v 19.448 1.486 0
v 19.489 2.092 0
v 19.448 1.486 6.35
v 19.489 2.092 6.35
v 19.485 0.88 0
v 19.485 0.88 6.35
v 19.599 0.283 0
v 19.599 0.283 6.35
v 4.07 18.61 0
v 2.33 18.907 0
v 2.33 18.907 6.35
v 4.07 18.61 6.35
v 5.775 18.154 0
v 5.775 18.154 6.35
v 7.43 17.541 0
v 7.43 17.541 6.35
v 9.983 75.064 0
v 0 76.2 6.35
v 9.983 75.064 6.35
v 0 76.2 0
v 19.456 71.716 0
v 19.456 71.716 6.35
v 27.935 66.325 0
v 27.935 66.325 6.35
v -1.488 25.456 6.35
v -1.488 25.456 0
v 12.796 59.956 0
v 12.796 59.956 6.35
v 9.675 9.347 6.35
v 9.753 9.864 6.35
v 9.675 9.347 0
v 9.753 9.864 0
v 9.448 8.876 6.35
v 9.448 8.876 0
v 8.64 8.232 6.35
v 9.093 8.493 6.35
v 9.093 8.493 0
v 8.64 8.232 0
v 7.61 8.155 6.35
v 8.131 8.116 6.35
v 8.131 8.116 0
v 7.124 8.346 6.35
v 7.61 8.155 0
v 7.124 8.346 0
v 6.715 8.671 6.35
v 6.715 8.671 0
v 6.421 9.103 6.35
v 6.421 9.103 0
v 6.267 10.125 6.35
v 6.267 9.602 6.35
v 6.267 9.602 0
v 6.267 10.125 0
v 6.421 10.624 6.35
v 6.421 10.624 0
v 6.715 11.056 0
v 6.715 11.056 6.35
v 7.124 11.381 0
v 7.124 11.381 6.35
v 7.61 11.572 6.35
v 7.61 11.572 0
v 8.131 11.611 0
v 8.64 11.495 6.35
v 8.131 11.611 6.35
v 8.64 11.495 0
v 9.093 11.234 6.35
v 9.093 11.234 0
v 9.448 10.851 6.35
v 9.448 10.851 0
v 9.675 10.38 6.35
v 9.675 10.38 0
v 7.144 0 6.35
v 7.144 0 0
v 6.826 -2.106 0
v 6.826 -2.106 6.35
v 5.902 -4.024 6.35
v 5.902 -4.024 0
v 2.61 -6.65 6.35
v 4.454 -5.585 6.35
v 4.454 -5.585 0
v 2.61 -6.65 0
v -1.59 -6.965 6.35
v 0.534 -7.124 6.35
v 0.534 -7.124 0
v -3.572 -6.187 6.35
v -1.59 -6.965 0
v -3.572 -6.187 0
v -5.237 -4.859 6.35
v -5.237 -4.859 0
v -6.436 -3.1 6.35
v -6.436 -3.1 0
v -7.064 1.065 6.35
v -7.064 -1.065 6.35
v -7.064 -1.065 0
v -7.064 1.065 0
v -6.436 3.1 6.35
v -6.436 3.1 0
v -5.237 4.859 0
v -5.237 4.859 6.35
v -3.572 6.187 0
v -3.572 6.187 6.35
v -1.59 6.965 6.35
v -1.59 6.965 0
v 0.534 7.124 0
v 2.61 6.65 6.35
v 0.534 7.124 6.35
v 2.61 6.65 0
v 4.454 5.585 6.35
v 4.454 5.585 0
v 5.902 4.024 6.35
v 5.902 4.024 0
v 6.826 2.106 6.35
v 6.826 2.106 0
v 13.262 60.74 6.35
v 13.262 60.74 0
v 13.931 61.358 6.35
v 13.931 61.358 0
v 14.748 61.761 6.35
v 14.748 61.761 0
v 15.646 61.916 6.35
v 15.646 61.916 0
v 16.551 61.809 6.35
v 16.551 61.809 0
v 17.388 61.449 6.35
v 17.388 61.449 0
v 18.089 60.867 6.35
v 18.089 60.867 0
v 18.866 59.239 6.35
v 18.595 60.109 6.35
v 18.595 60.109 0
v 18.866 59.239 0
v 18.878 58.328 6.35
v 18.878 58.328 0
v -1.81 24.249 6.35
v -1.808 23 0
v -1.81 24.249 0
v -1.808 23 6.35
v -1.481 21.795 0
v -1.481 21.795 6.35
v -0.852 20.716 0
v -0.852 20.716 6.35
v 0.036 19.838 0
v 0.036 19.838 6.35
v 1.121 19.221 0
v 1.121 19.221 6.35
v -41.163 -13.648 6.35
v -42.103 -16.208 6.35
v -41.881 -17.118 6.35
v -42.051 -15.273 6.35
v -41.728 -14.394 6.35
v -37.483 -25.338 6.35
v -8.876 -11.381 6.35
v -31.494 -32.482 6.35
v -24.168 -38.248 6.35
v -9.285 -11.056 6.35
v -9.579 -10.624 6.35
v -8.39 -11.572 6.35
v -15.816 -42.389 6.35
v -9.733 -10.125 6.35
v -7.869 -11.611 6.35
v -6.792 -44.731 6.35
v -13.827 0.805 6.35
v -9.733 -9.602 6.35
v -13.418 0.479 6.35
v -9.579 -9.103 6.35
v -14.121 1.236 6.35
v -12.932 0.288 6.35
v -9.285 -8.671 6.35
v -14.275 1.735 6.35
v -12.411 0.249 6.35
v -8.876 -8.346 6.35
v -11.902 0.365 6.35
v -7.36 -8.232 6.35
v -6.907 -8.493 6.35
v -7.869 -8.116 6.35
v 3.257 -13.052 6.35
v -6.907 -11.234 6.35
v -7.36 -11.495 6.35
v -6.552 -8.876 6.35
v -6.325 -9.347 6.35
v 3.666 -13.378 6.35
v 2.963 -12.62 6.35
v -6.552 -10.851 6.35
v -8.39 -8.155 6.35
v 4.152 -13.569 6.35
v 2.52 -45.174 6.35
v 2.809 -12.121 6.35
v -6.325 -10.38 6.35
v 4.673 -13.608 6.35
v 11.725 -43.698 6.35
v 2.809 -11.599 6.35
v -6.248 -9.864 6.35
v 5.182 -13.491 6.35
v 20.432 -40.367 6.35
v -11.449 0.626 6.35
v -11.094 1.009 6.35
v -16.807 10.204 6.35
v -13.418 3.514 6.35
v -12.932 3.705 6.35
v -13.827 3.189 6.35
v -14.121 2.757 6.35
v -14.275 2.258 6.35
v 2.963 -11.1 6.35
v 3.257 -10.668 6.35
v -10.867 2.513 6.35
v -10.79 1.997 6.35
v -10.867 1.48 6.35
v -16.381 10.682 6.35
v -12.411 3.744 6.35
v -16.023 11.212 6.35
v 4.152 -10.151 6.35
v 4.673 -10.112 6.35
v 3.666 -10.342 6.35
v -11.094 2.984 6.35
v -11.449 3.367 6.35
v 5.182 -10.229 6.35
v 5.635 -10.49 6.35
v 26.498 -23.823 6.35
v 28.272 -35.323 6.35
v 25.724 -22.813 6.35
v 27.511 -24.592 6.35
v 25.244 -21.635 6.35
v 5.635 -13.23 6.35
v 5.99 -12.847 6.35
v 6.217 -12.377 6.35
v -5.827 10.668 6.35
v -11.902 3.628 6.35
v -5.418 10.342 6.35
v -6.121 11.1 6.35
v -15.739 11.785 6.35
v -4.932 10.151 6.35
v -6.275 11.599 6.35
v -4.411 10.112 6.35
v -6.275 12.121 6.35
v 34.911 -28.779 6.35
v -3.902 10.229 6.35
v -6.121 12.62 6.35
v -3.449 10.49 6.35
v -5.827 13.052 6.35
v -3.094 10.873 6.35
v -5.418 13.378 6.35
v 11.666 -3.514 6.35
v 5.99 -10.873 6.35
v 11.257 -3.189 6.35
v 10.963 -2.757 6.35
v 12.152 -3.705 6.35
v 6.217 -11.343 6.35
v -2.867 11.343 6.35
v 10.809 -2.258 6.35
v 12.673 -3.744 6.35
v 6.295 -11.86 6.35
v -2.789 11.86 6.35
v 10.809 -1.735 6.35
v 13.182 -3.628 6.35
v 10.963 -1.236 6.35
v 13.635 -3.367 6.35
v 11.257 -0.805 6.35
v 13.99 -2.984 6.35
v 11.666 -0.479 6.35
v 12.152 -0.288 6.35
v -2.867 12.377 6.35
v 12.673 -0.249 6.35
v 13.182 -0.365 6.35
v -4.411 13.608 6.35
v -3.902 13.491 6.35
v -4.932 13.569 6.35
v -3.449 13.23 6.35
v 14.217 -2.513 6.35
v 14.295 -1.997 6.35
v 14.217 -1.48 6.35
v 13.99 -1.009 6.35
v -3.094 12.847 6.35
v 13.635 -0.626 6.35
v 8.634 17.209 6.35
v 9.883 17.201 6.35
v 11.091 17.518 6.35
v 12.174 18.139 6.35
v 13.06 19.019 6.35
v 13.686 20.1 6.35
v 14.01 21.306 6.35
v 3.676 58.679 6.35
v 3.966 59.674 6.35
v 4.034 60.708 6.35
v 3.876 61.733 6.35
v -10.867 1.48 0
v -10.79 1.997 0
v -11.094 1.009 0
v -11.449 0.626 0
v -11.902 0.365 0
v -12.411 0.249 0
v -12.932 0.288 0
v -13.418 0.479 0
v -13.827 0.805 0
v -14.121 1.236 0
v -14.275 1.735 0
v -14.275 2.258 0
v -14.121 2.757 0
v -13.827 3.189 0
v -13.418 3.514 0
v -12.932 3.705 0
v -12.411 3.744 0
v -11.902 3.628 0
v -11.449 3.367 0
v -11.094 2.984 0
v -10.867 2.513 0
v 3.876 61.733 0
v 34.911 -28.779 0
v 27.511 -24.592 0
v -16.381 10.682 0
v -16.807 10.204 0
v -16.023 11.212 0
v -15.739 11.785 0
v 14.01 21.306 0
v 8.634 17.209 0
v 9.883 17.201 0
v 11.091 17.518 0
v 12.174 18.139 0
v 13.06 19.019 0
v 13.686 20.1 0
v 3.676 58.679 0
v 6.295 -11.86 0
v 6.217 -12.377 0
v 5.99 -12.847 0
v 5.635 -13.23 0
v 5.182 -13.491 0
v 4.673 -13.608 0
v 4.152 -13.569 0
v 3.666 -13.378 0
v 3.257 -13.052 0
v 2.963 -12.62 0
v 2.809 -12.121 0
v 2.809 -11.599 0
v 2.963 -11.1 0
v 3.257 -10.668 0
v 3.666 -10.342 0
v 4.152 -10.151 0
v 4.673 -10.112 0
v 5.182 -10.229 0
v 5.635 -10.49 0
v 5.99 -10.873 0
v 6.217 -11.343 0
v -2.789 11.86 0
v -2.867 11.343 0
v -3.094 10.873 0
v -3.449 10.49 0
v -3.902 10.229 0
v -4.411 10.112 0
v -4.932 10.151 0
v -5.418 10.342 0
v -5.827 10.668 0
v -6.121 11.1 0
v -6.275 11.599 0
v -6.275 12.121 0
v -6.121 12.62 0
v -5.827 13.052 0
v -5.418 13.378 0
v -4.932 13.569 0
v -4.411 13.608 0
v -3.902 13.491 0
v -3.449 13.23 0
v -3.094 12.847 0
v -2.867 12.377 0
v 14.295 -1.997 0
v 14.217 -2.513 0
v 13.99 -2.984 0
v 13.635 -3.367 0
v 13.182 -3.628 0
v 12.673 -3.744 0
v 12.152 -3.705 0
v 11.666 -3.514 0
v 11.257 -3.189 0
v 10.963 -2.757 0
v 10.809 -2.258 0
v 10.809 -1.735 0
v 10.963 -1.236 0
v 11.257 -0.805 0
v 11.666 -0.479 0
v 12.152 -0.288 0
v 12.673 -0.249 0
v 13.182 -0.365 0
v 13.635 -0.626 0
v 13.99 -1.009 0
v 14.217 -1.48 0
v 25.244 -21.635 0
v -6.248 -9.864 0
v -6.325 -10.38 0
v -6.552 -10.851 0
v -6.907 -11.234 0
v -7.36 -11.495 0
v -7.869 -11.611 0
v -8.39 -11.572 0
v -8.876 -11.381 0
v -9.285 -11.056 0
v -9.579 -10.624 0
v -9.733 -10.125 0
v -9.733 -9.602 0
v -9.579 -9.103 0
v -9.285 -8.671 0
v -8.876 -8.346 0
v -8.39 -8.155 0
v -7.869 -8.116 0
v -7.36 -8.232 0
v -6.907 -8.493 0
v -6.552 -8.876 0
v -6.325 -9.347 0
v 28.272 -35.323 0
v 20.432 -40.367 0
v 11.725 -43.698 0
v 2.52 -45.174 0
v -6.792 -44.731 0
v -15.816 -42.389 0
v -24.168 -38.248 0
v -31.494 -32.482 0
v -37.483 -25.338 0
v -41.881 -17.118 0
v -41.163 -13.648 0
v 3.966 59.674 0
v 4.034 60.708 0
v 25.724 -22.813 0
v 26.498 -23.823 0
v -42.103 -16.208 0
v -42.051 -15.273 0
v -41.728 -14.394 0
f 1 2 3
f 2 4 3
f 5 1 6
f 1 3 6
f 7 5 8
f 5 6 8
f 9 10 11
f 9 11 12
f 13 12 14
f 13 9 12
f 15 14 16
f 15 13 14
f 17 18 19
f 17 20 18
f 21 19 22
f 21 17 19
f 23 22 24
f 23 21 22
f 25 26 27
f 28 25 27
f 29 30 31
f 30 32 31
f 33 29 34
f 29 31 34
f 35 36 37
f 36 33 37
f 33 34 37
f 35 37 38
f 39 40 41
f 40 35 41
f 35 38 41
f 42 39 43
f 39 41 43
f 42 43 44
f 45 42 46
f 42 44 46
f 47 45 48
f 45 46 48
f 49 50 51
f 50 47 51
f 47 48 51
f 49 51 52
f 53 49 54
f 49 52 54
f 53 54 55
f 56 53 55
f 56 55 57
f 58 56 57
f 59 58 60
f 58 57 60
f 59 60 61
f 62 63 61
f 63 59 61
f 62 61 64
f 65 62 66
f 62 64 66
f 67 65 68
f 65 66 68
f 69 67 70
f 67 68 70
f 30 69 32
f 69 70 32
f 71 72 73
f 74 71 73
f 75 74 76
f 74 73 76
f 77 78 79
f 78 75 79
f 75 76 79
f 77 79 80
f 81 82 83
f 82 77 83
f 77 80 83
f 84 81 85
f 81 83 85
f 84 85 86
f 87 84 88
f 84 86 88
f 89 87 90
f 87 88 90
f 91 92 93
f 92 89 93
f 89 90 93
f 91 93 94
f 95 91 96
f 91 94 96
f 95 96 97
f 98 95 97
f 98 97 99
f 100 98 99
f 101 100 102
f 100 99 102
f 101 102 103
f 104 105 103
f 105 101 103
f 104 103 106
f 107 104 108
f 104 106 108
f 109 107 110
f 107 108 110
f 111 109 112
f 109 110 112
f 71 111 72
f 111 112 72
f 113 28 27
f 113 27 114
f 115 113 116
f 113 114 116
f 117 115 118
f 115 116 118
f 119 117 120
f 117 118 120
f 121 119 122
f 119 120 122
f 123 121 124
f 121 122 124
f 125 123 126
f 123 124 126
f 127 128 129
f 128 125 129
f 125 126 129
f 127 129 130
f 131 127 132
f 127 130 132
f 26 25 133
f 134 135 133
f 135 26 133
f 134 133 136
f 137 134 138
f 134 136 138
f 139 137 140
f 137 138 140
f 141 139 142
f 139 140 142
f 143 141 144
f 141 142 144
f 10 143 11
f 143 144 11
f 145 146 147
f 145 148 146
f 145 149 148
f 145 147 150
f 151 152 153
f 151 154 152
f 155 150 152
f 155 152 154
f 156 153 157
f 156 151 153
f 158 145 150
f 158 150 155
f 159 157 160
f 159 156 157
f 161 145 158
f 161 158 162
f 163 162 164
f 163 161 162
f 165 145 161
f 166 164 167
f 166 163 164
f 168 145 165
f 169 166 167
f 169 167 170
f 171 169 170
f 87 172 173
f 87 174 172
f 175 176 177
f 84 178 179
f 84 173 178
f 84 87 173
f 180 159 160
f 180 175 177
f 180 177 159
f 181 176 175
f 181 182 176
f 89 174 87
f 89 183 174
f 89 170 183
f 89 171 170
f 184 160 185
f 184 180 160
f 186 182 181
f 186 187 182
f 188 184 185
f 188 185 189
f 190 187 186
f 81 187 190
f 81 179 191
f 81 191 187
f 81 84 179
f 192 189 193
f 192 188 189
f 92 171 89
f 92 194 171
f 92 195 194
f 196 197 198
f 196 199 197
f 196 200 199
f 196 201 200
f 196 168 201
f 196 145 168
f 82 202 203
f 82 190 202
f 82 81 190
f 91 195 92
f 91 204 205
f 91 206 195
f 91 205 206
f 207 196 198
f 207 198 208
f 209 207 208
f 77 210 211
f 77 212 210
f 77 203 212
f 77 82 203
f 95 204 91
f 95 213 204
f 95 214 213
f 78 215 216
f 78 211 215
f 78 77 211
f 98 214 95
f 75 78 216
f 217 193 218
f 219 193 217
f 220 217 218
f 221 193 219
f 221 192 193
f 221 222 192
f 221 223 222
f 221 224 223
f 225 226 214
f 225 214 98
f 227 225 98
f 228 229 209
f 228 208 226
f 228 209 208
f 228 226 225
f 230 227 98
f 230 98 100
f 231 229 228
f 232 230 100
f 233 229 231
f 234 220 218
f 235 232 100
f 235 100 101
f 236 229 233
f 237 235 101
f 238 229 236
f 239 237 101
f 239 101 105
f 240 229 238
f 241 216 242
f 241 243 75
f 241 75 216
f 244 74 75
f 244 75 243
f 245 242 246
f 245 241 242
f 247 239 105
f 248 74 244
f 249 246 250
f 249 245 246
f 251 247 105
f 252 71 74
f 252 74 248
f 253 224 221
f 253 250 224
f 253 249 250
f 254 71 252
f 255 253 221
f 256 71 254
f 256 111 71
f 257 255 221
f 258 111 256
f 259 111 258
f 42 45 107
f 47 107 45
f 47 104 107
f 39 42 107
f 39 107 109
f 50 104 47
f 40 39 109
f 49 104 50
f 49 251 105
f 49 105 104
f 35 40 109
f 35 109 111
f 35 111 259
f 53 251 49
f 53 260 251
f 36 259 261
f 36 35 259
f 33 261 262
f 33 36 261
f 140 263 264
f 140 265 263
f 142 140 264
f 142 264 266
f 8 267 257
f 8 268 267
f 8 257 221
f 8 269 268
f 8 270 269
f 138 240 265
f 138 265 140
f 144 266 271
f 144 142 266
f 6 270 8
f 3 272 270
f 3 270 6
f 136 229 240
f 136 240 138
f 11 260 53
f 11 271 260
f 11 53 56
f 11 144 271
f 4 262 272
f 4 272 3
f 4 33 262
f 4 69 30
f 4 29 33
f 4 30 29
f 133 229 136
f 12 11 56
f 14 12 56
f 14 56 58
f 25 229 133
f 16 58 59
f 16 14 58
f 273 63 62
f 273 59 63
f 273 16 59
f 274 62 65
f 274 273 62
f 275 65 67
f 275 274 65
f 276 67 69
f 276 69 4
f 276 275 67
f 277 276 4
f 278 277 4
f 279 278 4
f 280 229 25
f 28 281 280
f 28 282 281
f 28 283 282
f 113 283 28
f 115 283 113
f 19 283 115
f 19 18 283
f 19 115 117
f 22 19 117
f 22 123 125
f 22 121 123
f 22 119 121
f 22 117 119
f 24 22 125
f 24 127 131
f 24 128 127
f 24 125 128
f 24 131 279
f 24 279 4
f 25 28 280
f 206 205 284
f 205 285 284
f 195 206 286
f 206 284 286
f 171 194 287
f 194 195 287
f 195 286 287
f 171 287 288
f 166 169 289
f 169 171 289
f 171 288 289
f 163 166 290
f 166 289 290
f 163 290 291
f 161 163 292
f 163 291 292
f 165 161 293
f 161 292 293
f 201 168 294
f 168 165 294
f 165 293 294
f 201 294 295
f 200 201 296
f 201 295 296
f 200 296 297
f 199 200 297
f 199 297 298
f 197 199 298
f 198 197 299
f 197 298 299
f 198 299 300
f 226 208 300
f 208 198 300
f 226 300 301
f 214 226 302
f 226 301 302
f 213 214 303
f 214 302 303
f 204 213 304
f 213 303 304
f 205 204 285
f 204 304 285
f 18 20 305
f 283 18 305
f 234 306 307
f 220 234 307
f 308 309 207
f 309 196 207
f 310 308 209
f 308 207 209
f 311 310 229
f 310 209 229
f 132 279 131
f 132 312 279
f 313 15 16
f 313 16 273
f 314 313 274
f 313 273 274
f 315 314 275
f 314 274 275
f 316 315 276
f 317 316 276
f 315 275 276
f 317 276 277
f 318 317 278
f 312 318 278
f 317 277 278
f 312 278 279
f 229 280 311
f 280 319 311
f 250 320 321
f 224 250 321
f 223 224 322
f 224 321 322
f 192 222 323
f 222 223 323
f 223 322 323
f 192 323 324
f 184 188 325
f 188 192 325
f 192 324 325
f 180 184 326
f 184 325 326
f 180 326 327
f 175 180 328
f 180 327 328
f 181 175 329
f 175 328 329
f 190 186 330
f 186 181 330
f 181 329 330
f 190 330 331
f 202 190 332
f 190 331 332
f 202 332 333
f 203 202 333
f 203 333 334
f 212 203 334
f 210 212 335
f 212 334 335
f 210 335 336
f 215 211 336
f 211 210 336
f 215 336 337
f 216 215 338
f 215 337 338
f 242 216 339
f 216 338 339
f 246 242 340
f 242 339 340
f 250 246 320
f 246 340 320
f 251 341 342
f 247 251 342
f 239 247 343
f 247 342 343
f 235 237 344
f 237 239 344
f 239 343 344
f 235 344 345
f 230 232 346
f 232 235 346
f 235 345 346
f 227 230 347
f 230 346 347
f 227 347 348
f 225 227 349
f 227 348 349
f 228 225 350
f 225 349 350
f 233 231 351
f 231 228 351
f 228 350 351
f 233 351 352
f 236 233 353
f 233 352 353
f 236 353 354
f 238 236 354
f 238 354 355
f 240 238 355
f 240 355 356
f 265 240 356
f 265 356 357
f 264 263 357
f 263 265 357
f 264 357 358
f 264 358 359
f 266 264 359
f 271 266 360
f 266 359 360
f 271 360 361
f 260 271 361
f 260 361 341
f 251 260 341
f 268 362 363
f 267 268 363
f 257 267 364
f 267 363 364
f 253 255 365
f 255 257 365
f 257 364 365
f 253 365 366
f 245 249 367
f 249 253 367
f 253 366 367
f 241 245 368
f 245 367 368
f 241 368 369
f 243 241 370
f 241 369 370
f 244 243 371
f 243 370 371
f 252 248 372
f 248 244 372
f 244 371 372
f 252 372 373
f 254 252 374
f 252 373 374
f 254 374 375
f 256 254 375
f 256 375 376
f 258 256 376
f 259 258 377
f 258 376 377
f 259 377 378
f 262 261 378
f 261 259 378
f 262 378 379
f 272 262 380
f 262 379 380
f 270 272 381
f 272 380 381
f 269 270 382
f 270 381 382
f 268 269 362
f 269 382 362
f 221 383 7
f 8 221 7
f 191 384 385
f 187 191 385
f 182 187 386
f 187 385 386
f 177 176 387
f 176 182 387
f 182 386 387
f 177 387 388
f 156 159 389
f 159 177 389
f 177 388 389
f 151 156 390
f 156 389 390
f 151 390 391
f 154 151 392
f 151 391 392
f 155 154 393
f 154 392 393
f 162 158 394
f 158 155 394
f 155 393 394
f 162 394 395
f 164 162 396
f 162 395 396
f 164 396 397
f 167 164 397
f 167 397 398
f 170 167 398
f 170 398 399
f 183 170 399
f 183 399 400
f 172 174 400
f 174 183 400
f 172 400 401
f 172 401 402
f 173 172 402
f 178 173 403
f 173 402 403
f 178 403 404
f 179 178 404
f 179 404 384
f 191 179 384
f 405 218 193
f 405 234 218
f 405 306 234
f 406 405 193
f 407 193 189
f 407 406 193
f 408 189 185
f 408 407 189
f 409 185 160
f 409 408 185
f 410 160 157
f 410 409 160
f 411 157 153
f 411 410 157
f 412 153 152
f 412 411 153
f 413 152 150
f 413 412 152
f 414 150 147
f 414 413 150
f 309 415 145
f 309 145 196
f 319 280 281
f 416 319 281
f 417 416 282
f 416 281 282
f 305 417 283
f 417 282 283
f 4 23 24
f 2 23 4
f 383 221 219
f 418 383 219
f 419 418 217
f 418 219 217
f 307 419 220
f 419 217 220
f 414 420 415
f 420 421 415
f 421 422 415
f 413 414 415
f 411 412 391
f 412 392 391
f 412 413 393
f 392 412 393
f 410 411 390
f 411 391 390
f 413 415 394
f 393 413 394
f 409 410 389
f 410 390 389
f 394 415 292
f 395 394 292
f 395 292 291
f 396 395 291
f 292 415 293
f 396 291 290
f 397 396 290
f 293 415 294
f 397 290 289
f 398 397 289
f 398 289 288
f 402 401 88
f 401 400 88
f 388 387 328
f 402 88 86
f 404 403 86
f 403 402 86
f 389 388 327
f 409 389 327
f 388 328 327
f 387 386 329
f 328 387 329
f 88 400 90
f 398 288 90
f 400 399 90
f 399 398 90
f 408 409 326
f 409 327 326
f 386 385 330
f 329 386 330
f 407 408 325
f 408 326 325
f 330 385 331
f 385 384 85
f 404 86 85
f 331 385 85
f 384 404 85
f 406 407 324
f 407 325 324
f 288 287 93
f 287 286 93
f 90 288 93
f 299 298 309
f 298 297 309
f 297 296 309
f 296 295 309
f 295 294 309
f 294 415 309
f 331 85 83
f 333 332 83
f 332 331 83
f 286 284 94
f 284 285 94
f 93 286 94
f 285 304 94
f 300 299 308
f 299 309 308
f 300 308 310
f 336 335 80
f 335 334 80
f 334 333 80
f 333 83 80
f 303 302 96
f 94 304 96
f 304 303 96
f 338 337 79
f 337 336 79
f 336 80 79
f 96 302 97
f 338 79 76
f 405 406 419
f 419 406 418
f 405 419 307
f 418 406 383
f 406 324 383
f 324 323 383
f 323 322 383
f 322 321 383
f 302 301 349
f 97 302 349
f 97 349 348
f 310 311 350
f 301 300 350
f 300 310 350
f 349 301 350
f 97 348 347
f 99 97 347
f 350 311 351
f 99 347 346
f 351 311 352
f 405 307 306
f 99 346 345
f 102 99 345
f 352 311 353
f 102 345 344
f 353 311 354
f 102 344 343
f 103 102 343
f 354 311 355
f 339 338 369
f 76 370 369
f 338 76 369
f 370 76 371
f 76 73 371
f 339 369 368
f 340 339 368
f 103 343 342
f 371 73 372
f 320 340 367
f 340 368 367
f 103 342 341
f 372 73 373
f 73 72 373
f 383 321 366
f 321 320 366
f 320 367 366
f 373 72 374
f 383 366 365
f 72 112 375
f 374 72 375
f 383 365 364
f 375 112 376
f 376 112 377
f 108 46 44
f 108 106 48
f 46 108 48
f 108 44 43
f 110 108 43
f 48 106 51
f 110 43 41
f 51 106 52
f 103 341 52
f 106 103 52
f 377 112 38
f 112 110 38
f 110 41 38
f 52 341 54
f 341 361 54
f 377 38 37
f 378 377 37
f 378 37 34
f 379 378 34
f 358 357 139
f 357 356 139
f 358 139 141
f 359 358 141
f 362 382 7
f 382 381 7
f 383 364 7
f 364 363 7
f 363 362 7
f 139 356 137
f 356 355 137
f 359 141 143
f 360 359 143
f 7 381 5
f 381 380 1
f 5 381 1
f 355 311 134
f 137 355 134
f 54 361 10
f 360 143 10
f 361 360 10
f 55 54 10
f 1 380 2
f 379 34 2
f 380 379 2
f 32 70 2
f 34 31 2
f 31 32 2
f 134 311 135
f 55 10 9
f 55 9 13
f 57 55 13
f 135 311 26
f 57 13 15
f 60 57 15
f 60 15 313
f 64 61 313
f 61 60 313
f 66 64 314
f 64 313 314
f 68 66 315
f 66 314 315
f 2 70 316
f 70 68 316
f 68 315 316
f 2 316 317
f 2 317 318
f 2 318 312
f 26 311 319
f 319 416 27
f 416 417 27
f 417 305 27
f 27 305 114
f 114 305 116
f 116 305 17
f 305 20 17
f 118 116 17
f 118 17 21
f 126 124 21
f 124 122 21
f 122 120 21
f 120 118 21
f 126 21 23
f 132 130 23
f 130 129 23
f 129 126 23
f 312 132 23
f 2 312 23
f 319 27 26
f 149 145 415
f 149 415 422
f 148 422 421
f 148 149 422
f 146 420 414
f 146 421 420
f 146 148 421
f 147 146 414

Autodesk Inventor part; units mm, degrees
ref_plane "YZ Plane" through (0, 0, 0) normal (1, 0, 0) x (0, 1, 0)
ref_plane "XZ Plane" through (0, 0, 0) normal (0, 1, 0) x (-1, 0, 0)
ref_plane "XY Plane" through (0, 0, 0) normal (0, 0, 1) x (1, 0, 0)
sketch "Sketch1" plane through (0, 0, 0) normal (0, 0, 1) x (1, 0, 0)
  circle A0 centre (0, 0) radius 76.2 construction
  circle A1 centre (0, 0) radius 7.1437
  circle A2 centre (0, 0) radius 12.7 construction
  circle A3 centre (0, 0) radius 19.05
  line L0 (0, 76.2) -> (0, 0) construction
  line L1 (0, 76.2) -> (4.2947, 60.1719)
  line L2 (4.2947, 60.1719) -> (-17.6011, 7.2873)
  circle A4 centre (0, 0) radius 60.325 construction
  arc A5 (27.9352, 66.3249) -> (0, 76.2) centre (0, 31.75) ccw
  line L3 (27.9352, 66.3249) -> (18.8874, -2.4836)
  circle A6 centre (0, 0) radius 45.2437 construction
  line L4 (34.9112, -28.7786) -> (0, 0) construction
  line L5 (34.9112, -28.7786) -> (25.7494, -23.595)
  line L6 (25.7494, -23.595) -> (18.4479, 4.7518)
  circle A7 centre (0, 0) radius 34.925 construction
  arc A8 (-42.6486, -15.1027) -> (34.9112, -28.7786) centre (0, 0) ccw
  line L7 (-42.6486, -15.1027) -> (-13.3288, 13.6105)
  line L8 (-42.6486, -15.1027) -> (0, 0) construction
  line L9 (-4.3483, 18.5471) -> (12.7964, 59.9565)
  line L10 (13.0349, 13.8922) -> (18.8778, 58.328)
  arc A9 (18.8778, 58.328) -> (12.7964, 59.9565) centre (15.7299, 58.7419) ccw
  line L11 (-10.5232, 7.11) -> (0, 0) construction
  line L12 (0, 0) -> (-4.542, 11.86) construction
  circle A10 centre (-4.542, 11.86) radius 1.7526
  circle A11 centre (-12.5421, 1.9966) radius 1.7526
  circle A12 centre (-8.0001, -9.8635) radius 1.7526
  circle A13 centre (4.542, -11.86) radius 1.7526
  circle A14 centre (12.5421, -1.9966) radius 1.7526
  circle A15 centre (8.0001, 9.8635) radius 1.7526
  point P0 (19.3687, 1.1767)
  point P1 (-15.8759, 11.4541)
  point P2 (-16.1113, 10.8856)
  dimension "d0" = 152.4
  dimension "d14" = 15.875
  dimension "d17" = 69.85
  dimension "d1" = 14.2875
  dimension "d2" = 25.4
  dimension "d8" = 38.1
  dimension "d9" = 15
  dimension "d11" = 44.45
  dimension "d12" = 15
  dimension "d15" = 90.4875
  dimension "d16" = 10
  dimension "d18" = 50.5
  dimension "d19" = 121
  dimension "d28" = 7.9375
  dimension "d29" = 7.9375
  dimension "d30" = 3.175
  dimension "d31" = 35
  dimension "d32" = 3.5052
  dimension "d35" = 360
extrude "Extrusion1" add sketch "Sketch1" along normal blind 6.35 contours A3 | A3 L6 L3 | A3 L10 A9 L9 L7 L2 L1 A5 L3 L6 | L3 L6 L5 A8 L7 L2 A3 | L2 L7 A3
fillet "Fillet1" radius 4.7625 6 edges at (19.3687, 1.1767, 3.175) (25.7494, -23.595, 3.175) (4.2947, 60.1719, 3.175) (-4.3483, 18.5471, 3.175) (13.0349, 13.8922, 3.175) (-16.1113, 10.8856, 3.175)
fillet "Fillet3" radius 3.175 1 edges at (-42.6486, -15.1027, 3.175)
sketch "Sketch2" plane through (0, 0, 6.35) normal (0, 0, 1) x (1, 0, 0)
  arc A0 (27.9352, 66.3249) -> (0, 76.2) centre (0, 31.75) ccw construction
  circle A1 centre (0, 0) radius 76.2 construction
equation "\"d29\" = d28"
properties part number "Blade" material "Steel, Alloy"
